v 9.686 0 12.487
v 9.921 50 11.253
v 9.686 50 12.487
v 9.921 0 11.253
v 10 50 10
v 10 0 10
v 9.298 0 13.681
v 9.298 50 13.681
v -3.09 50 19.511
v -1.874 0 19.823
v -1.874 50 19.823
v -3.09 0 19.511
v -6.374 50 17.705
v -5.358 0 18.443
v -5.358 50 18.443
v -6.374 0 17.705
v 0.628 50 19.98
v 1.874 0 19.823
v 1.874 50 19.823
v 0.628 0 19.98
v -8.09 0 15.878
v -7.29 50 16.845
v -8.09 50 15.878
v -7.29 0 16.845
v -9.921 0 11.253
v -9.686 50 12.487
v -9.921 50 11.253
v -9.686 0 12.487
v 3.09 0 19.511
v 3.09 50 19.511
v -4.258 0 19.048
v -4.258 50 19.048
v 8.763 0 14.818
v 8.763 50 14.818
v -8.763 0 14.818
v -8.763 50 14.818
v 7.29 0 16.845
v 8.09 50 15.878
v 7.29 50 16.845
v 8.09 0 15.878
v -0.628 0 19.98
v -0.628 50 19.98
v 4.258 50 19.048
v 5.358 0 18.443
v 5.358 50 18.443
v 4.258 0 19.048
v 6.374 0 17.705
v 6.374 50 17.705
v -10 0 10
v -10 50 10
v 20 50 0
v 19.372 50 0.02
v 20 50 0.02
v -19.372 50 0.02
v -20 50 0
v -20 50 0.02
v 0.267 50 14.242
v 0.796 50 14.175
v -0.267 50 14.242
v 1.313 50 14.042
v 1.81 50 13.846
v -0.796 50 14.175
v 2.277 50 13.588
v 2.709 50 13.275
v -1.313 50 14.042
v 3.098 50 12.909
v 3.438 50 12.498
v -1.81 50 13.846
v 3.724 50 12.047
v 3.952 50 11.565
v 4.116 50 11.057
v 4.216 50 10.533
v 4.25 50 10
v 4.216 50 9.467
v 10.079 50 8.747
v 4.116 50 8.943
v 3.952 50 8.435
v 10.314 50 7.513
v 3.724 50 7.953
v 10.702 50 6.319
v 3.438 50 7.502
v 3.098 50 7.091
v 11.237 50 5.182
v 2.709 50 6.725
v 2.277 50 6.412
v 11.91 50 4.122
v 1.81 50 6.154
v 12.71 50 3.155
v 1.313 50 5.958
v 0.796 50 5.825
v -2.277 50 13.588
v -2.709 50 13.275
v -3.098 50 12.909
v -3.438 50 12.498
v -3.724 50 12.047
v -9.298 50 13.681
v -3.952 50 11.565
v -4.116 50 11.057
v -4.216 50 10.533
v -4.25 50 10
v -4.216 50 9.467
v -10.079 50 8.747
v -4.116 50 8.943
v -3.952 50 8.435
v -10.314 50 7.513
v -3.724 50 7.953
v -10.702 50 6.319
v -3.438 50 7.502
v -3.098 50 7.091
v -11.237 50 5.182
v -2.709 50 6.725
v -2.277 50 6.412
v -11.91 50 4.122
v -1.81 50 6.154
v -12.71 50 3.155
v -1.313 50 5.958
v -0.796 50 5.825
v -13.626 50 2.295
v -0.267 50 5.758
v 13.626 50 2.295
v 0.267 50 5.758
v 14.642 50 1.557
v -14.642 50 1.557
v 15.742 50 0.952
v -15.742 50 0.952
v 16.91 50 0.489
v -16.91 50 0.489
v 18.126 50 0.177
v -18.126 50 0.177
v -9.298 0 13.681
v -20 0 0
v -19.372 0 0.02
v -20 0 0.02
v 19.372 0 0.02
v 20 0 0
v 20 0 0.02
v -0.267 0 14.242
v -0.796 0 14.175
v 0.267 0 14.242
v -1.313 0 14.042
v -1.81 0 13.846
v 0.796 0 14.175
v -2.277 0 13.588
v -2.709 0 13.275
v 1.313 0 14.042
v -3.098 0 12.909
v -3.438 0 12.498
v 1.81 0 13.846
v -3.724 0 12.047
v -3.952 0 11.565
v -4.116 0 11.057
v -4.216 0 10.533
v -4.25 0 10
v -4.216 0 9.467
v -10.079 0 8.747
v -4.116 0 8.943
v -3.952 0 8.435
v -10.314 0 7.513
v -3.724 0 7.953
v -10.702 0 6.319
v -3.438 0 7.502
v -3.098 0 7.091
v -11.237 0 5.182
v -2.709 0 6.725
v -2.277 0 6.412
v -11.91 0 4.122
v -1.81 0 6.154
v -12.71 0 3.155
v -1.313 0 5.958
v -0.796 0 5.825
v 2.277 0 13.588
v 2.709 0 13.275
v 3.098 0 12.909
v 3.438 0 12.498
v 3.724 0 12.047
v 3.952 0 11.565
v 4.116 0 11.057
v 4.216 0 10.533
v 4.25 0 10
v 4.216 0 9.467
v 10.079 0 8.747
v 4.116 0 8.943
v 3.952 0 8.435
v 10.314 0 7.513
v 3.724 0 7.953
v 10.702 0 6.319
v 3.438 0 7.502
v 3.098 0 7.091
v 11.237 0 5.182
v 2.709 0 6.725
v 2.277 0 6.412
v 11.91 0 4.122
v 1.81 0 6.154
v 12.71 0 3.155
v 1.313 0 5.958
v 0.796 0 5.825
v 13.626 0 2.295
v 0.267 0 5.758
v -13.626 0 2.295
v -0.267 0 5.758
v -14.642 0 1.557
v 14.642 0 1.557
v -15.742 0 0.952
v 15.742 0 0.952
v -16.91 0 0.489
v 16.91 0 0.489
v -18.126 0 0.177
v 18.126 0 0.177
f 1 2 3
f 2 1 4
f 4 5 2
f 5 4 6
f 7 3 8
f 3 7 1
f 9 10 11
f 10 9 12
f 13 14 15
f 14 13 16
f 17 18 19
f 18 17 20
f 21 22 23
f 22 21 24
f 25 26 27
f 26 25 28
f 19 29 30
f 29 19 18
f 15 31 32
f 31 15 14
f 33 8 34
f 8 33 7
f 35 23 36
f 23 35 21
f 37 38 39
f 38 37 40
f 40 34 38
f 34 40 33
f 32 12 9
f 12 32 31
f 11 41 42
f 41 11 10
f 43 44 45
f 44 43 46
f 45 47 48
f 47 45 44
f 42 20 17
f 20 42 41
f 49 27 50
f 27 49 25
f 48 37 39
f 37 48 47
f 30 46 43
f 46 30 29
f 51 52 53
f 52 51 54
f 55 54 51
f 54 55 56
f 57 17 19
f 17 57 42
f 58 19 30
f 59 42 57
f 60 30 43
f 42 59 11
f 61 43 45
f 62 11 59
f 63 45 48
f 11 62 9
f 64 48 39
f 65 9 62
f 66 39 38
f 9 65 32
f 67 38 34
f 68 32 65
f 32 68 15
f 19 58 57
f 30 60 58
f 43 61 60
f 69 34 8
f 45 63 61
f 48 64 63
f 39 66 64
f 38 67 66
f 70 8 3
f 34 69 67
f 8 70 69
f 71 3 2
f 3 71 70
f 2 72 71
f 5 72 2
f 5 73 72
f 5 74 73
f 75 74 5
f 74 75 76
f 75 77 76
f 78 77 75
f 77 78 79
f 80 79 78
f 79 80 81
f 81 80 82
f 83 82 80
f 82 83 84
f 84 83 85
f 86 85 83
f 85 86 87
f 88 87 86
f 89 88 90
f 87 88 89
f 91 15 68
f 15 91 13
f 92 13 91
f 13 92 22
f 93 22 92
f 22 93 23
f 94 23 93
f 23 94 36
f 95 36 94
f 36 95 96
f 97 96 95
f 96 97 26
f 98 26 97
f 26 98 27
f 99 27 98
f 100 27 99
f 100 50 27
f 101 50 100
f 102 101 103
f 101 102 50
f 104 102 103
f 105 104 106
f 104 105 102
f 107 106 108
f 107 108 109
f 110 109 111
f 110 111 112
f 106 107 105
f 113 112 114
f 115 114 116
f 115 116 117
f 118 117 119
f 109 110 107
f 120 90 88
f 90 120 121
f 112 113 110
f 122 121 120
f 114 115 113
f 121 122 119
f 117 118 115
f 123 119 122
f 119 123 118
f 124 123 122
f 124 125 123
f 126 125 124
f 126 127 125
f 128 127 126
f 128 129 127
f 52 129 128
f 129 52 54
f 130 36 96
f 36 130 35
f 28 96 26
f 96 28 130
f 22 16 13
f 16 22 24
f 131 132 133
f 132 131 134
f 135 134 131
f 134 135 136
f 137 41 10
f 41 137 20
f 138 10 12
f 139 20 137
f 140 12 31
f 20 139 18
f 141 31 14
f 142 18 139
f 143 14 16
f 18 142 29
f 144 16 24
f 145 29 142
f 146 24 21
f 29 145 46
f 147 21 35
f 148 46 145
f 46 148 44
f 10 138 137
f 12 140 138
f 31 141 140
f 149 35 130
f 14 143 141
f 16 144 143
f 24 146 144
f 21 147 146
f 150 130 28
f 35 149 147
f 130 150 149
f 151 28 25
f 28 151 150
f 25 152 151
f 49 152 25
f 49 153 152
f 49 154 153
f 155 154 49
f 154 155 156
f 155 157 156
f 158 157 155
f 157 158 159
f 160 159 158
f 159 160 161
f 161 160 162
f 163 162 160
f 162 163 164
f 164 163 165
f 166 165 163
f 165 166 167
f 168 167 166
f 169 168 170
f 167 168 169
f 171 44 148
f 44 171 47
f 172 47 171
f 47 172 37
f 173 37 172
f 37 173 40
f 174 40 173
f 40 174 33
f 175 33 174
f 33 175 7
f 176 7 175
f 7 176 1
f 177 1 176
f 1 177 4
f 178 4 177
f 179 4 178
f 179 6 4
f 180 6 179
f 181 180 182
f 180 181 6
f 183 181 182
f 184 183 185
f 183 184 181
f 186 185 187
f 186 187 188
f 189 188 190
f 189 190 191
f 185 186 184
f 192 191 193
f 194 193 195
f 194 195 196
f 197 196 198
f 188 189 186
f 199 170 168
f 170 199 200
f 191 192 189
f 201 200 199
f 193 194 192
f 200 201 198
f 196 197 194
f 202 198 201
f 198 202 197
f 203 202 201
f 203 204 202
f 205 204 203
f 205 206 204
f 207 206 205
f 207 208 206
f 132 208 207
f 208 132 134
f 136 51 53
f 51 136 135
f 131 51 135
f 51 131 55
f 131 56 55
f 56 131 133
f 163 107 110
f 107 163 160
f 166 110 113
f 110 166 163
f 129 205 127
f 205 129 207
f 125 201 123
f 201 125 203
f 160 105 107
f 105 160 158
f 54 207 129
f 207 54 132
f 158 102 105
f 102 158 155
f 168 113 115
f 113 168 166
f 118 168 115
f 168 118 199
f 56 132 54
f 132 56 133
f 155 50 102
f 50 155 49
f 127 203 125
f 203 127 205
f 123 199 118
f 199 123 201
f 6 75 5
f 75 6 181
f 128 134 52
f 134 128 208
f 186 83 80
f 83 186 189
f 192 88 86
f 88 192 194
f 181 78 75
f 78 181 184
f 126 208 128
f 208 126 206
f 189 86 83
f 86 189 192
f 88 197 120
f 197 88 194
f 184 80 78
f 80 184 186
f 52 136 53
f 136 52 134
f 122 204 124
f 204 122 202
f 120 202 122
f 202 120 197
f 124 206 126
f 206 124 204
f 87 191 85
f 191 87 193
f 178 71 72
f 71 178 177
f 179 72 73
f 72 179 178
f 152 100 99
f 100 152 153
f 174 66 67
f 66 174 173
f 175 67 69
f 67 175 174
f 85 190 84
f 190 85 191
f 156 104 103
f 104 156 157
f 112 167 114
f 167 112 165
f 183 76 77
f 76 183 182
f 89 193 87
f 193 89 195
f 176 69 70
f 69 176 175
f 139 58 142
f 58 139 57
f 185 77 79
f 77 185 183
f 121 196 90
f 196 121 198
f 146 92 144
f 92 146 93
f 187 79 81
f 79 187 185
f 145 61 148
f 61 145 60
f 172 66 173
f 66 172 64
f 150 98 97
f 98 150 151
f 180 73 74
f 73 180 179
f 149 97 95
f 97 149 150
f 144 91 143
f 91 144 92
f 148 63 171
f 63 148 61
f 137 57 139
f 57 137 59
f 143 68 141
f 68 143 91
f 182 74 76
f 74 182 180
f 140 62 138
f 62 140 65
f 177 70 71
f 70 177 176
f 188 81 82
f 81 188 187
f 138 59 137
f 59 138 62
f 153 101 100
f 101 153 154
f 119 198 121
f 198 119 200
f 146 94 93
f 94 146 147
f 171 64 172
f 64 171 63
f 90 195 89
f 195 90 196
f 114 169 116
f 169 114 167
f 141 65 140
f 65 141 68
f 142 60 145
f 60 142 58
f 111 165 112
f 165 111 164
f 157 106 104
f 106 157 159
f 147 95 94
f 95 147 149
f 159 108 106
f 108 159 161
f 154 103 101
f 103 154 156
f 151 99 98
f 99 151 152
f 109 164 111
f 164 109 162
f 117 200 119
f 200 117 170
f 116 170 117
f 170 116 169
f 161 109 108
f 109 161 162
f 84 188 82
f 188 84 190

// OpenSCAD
// file: variables.scad
// ##########################################//
// General
// ##########################################//
$fn = 50;
DIFFERENCE_FIX = 0.1;
DIFFERENCE_FIX_NEGATIVE = -1 * DIFFERENCE_FIX;
DIFFERENCE_FIX_2 = 2 * DIFFERENCE_FIX;

// ##########################################//
// Nose
// ##########################################//
noseTopThickness = 1;
noseTopOffsetZ = 60;
noseHeight = noseTopOffsetZ + noseTopThickness;
noseLength = 100;
noseTopEndOffset = 20;
noseTopSharpnessFactor = 4;
noseBotttomSharpnessFactor = 3;
noseTopThicknessFactor = 1;
noseBottomThicknessFactor = 3;

// ##########################################//
// Hull
// ##########################################//
hullThickness = 3;
hullWidth = 70 - hullThickness * 2;
hullLength = 500 - hullThickness * 2;
hullHeight = noseHeight + hullThickness;
hullSpacing = 100;
hullCutoutWidth = 46;
hullCutoutHeight = 150;

// ##########################################//
// Hull Mounts
// ##########################################//
hullMountHoleRadius = 4.25;
hullMountHeight = 20;
hullMountWidth = 20;
hullMountDepth = 50;
hullMountOffsetY = 100;

// ##########################################//
// Rod Connectors
// ##########################################//
rodConnectorWidth = 20;
rodConnectorRadius = 10;
rodConnectorTopOffset = 3;

// ##########################################//
// Lid
// ##########################################//
lidLip = 5;
lidThickness = 3;
lidGap = 0.4;
lidText = "+1 555 123 1234";
lidTextOffsetX = 28;
lidTextOffsetY = 20;

// ##########################################//
// Motor mount
// ##########################################//
motorMountMotorRadius = 35;
motorMountMotorDepth = 100;
motorMountThickness = 4;
motorMountMountThickness = 5;
motorMountMountOffsetX = 20;
motorMountSupportHeight = 10;
motorMountSupportExtensionY = 30;
motorMountOffsetY = 300;
motorMountRudderSupportHeight = 5;
motorMountRudderSupportWidth = 10;
motorMountRudderSupportExtensionY = 20;


// ##########################################//
// Rudder
// ##########################################//
rudderHeight = motorMountMotorRadius * 2 - 10;
rudderWidth = 60;
rudderThickness = 3;
rudderMountTopHeight = motorMountRudderSupportHeight + 1;
// main file
include <variables.scad>

module hullMount() {
    difference() {
        hullMountBody();

        // Hole
        translate([0, hullMountDepth + DIFFERENCE_FIX, hullMountHeight / 2])
        rotate([90, 0, 0])
        cylinder(h = hullMountDepth + DIFFERENCE_FIX_2, r = hullMountHoleRadius);
    }
}

module hullMountBody() {
    difference() {
        union() {
            translate([0, hullMountDepth, hullMountHeight / 2])
            rotate([90, 0, 0])
            cylinder(h = hullMountDepth, r = hullMountHeight / 2);

            translate([-hullMountWidth, 0, 0])
            cube([hullMountWidth * 2, hullMountDepth, hullMountHeight / 2]);
        }

        translate([-hullMountWidth, hullMountDepth + DIFFERENCE_FIX, hullMountHeight / 2])
        rotate([90, 0, 0])
        cylinder(h = hullMountDepth + DIFFERENCE_FIX_2, r = hullMountHeight / 2);

        translate([hullMountWidth, hullMountDepth + DIFFERENCE_FIX, hullMountHeight / 2])
        rotate([90, 0, 0])
        cylinder(h = hullMountDepth + DIFFERENCE_FIX_2, r = hullMountHeight / 2);
    }
}

hullMount();
